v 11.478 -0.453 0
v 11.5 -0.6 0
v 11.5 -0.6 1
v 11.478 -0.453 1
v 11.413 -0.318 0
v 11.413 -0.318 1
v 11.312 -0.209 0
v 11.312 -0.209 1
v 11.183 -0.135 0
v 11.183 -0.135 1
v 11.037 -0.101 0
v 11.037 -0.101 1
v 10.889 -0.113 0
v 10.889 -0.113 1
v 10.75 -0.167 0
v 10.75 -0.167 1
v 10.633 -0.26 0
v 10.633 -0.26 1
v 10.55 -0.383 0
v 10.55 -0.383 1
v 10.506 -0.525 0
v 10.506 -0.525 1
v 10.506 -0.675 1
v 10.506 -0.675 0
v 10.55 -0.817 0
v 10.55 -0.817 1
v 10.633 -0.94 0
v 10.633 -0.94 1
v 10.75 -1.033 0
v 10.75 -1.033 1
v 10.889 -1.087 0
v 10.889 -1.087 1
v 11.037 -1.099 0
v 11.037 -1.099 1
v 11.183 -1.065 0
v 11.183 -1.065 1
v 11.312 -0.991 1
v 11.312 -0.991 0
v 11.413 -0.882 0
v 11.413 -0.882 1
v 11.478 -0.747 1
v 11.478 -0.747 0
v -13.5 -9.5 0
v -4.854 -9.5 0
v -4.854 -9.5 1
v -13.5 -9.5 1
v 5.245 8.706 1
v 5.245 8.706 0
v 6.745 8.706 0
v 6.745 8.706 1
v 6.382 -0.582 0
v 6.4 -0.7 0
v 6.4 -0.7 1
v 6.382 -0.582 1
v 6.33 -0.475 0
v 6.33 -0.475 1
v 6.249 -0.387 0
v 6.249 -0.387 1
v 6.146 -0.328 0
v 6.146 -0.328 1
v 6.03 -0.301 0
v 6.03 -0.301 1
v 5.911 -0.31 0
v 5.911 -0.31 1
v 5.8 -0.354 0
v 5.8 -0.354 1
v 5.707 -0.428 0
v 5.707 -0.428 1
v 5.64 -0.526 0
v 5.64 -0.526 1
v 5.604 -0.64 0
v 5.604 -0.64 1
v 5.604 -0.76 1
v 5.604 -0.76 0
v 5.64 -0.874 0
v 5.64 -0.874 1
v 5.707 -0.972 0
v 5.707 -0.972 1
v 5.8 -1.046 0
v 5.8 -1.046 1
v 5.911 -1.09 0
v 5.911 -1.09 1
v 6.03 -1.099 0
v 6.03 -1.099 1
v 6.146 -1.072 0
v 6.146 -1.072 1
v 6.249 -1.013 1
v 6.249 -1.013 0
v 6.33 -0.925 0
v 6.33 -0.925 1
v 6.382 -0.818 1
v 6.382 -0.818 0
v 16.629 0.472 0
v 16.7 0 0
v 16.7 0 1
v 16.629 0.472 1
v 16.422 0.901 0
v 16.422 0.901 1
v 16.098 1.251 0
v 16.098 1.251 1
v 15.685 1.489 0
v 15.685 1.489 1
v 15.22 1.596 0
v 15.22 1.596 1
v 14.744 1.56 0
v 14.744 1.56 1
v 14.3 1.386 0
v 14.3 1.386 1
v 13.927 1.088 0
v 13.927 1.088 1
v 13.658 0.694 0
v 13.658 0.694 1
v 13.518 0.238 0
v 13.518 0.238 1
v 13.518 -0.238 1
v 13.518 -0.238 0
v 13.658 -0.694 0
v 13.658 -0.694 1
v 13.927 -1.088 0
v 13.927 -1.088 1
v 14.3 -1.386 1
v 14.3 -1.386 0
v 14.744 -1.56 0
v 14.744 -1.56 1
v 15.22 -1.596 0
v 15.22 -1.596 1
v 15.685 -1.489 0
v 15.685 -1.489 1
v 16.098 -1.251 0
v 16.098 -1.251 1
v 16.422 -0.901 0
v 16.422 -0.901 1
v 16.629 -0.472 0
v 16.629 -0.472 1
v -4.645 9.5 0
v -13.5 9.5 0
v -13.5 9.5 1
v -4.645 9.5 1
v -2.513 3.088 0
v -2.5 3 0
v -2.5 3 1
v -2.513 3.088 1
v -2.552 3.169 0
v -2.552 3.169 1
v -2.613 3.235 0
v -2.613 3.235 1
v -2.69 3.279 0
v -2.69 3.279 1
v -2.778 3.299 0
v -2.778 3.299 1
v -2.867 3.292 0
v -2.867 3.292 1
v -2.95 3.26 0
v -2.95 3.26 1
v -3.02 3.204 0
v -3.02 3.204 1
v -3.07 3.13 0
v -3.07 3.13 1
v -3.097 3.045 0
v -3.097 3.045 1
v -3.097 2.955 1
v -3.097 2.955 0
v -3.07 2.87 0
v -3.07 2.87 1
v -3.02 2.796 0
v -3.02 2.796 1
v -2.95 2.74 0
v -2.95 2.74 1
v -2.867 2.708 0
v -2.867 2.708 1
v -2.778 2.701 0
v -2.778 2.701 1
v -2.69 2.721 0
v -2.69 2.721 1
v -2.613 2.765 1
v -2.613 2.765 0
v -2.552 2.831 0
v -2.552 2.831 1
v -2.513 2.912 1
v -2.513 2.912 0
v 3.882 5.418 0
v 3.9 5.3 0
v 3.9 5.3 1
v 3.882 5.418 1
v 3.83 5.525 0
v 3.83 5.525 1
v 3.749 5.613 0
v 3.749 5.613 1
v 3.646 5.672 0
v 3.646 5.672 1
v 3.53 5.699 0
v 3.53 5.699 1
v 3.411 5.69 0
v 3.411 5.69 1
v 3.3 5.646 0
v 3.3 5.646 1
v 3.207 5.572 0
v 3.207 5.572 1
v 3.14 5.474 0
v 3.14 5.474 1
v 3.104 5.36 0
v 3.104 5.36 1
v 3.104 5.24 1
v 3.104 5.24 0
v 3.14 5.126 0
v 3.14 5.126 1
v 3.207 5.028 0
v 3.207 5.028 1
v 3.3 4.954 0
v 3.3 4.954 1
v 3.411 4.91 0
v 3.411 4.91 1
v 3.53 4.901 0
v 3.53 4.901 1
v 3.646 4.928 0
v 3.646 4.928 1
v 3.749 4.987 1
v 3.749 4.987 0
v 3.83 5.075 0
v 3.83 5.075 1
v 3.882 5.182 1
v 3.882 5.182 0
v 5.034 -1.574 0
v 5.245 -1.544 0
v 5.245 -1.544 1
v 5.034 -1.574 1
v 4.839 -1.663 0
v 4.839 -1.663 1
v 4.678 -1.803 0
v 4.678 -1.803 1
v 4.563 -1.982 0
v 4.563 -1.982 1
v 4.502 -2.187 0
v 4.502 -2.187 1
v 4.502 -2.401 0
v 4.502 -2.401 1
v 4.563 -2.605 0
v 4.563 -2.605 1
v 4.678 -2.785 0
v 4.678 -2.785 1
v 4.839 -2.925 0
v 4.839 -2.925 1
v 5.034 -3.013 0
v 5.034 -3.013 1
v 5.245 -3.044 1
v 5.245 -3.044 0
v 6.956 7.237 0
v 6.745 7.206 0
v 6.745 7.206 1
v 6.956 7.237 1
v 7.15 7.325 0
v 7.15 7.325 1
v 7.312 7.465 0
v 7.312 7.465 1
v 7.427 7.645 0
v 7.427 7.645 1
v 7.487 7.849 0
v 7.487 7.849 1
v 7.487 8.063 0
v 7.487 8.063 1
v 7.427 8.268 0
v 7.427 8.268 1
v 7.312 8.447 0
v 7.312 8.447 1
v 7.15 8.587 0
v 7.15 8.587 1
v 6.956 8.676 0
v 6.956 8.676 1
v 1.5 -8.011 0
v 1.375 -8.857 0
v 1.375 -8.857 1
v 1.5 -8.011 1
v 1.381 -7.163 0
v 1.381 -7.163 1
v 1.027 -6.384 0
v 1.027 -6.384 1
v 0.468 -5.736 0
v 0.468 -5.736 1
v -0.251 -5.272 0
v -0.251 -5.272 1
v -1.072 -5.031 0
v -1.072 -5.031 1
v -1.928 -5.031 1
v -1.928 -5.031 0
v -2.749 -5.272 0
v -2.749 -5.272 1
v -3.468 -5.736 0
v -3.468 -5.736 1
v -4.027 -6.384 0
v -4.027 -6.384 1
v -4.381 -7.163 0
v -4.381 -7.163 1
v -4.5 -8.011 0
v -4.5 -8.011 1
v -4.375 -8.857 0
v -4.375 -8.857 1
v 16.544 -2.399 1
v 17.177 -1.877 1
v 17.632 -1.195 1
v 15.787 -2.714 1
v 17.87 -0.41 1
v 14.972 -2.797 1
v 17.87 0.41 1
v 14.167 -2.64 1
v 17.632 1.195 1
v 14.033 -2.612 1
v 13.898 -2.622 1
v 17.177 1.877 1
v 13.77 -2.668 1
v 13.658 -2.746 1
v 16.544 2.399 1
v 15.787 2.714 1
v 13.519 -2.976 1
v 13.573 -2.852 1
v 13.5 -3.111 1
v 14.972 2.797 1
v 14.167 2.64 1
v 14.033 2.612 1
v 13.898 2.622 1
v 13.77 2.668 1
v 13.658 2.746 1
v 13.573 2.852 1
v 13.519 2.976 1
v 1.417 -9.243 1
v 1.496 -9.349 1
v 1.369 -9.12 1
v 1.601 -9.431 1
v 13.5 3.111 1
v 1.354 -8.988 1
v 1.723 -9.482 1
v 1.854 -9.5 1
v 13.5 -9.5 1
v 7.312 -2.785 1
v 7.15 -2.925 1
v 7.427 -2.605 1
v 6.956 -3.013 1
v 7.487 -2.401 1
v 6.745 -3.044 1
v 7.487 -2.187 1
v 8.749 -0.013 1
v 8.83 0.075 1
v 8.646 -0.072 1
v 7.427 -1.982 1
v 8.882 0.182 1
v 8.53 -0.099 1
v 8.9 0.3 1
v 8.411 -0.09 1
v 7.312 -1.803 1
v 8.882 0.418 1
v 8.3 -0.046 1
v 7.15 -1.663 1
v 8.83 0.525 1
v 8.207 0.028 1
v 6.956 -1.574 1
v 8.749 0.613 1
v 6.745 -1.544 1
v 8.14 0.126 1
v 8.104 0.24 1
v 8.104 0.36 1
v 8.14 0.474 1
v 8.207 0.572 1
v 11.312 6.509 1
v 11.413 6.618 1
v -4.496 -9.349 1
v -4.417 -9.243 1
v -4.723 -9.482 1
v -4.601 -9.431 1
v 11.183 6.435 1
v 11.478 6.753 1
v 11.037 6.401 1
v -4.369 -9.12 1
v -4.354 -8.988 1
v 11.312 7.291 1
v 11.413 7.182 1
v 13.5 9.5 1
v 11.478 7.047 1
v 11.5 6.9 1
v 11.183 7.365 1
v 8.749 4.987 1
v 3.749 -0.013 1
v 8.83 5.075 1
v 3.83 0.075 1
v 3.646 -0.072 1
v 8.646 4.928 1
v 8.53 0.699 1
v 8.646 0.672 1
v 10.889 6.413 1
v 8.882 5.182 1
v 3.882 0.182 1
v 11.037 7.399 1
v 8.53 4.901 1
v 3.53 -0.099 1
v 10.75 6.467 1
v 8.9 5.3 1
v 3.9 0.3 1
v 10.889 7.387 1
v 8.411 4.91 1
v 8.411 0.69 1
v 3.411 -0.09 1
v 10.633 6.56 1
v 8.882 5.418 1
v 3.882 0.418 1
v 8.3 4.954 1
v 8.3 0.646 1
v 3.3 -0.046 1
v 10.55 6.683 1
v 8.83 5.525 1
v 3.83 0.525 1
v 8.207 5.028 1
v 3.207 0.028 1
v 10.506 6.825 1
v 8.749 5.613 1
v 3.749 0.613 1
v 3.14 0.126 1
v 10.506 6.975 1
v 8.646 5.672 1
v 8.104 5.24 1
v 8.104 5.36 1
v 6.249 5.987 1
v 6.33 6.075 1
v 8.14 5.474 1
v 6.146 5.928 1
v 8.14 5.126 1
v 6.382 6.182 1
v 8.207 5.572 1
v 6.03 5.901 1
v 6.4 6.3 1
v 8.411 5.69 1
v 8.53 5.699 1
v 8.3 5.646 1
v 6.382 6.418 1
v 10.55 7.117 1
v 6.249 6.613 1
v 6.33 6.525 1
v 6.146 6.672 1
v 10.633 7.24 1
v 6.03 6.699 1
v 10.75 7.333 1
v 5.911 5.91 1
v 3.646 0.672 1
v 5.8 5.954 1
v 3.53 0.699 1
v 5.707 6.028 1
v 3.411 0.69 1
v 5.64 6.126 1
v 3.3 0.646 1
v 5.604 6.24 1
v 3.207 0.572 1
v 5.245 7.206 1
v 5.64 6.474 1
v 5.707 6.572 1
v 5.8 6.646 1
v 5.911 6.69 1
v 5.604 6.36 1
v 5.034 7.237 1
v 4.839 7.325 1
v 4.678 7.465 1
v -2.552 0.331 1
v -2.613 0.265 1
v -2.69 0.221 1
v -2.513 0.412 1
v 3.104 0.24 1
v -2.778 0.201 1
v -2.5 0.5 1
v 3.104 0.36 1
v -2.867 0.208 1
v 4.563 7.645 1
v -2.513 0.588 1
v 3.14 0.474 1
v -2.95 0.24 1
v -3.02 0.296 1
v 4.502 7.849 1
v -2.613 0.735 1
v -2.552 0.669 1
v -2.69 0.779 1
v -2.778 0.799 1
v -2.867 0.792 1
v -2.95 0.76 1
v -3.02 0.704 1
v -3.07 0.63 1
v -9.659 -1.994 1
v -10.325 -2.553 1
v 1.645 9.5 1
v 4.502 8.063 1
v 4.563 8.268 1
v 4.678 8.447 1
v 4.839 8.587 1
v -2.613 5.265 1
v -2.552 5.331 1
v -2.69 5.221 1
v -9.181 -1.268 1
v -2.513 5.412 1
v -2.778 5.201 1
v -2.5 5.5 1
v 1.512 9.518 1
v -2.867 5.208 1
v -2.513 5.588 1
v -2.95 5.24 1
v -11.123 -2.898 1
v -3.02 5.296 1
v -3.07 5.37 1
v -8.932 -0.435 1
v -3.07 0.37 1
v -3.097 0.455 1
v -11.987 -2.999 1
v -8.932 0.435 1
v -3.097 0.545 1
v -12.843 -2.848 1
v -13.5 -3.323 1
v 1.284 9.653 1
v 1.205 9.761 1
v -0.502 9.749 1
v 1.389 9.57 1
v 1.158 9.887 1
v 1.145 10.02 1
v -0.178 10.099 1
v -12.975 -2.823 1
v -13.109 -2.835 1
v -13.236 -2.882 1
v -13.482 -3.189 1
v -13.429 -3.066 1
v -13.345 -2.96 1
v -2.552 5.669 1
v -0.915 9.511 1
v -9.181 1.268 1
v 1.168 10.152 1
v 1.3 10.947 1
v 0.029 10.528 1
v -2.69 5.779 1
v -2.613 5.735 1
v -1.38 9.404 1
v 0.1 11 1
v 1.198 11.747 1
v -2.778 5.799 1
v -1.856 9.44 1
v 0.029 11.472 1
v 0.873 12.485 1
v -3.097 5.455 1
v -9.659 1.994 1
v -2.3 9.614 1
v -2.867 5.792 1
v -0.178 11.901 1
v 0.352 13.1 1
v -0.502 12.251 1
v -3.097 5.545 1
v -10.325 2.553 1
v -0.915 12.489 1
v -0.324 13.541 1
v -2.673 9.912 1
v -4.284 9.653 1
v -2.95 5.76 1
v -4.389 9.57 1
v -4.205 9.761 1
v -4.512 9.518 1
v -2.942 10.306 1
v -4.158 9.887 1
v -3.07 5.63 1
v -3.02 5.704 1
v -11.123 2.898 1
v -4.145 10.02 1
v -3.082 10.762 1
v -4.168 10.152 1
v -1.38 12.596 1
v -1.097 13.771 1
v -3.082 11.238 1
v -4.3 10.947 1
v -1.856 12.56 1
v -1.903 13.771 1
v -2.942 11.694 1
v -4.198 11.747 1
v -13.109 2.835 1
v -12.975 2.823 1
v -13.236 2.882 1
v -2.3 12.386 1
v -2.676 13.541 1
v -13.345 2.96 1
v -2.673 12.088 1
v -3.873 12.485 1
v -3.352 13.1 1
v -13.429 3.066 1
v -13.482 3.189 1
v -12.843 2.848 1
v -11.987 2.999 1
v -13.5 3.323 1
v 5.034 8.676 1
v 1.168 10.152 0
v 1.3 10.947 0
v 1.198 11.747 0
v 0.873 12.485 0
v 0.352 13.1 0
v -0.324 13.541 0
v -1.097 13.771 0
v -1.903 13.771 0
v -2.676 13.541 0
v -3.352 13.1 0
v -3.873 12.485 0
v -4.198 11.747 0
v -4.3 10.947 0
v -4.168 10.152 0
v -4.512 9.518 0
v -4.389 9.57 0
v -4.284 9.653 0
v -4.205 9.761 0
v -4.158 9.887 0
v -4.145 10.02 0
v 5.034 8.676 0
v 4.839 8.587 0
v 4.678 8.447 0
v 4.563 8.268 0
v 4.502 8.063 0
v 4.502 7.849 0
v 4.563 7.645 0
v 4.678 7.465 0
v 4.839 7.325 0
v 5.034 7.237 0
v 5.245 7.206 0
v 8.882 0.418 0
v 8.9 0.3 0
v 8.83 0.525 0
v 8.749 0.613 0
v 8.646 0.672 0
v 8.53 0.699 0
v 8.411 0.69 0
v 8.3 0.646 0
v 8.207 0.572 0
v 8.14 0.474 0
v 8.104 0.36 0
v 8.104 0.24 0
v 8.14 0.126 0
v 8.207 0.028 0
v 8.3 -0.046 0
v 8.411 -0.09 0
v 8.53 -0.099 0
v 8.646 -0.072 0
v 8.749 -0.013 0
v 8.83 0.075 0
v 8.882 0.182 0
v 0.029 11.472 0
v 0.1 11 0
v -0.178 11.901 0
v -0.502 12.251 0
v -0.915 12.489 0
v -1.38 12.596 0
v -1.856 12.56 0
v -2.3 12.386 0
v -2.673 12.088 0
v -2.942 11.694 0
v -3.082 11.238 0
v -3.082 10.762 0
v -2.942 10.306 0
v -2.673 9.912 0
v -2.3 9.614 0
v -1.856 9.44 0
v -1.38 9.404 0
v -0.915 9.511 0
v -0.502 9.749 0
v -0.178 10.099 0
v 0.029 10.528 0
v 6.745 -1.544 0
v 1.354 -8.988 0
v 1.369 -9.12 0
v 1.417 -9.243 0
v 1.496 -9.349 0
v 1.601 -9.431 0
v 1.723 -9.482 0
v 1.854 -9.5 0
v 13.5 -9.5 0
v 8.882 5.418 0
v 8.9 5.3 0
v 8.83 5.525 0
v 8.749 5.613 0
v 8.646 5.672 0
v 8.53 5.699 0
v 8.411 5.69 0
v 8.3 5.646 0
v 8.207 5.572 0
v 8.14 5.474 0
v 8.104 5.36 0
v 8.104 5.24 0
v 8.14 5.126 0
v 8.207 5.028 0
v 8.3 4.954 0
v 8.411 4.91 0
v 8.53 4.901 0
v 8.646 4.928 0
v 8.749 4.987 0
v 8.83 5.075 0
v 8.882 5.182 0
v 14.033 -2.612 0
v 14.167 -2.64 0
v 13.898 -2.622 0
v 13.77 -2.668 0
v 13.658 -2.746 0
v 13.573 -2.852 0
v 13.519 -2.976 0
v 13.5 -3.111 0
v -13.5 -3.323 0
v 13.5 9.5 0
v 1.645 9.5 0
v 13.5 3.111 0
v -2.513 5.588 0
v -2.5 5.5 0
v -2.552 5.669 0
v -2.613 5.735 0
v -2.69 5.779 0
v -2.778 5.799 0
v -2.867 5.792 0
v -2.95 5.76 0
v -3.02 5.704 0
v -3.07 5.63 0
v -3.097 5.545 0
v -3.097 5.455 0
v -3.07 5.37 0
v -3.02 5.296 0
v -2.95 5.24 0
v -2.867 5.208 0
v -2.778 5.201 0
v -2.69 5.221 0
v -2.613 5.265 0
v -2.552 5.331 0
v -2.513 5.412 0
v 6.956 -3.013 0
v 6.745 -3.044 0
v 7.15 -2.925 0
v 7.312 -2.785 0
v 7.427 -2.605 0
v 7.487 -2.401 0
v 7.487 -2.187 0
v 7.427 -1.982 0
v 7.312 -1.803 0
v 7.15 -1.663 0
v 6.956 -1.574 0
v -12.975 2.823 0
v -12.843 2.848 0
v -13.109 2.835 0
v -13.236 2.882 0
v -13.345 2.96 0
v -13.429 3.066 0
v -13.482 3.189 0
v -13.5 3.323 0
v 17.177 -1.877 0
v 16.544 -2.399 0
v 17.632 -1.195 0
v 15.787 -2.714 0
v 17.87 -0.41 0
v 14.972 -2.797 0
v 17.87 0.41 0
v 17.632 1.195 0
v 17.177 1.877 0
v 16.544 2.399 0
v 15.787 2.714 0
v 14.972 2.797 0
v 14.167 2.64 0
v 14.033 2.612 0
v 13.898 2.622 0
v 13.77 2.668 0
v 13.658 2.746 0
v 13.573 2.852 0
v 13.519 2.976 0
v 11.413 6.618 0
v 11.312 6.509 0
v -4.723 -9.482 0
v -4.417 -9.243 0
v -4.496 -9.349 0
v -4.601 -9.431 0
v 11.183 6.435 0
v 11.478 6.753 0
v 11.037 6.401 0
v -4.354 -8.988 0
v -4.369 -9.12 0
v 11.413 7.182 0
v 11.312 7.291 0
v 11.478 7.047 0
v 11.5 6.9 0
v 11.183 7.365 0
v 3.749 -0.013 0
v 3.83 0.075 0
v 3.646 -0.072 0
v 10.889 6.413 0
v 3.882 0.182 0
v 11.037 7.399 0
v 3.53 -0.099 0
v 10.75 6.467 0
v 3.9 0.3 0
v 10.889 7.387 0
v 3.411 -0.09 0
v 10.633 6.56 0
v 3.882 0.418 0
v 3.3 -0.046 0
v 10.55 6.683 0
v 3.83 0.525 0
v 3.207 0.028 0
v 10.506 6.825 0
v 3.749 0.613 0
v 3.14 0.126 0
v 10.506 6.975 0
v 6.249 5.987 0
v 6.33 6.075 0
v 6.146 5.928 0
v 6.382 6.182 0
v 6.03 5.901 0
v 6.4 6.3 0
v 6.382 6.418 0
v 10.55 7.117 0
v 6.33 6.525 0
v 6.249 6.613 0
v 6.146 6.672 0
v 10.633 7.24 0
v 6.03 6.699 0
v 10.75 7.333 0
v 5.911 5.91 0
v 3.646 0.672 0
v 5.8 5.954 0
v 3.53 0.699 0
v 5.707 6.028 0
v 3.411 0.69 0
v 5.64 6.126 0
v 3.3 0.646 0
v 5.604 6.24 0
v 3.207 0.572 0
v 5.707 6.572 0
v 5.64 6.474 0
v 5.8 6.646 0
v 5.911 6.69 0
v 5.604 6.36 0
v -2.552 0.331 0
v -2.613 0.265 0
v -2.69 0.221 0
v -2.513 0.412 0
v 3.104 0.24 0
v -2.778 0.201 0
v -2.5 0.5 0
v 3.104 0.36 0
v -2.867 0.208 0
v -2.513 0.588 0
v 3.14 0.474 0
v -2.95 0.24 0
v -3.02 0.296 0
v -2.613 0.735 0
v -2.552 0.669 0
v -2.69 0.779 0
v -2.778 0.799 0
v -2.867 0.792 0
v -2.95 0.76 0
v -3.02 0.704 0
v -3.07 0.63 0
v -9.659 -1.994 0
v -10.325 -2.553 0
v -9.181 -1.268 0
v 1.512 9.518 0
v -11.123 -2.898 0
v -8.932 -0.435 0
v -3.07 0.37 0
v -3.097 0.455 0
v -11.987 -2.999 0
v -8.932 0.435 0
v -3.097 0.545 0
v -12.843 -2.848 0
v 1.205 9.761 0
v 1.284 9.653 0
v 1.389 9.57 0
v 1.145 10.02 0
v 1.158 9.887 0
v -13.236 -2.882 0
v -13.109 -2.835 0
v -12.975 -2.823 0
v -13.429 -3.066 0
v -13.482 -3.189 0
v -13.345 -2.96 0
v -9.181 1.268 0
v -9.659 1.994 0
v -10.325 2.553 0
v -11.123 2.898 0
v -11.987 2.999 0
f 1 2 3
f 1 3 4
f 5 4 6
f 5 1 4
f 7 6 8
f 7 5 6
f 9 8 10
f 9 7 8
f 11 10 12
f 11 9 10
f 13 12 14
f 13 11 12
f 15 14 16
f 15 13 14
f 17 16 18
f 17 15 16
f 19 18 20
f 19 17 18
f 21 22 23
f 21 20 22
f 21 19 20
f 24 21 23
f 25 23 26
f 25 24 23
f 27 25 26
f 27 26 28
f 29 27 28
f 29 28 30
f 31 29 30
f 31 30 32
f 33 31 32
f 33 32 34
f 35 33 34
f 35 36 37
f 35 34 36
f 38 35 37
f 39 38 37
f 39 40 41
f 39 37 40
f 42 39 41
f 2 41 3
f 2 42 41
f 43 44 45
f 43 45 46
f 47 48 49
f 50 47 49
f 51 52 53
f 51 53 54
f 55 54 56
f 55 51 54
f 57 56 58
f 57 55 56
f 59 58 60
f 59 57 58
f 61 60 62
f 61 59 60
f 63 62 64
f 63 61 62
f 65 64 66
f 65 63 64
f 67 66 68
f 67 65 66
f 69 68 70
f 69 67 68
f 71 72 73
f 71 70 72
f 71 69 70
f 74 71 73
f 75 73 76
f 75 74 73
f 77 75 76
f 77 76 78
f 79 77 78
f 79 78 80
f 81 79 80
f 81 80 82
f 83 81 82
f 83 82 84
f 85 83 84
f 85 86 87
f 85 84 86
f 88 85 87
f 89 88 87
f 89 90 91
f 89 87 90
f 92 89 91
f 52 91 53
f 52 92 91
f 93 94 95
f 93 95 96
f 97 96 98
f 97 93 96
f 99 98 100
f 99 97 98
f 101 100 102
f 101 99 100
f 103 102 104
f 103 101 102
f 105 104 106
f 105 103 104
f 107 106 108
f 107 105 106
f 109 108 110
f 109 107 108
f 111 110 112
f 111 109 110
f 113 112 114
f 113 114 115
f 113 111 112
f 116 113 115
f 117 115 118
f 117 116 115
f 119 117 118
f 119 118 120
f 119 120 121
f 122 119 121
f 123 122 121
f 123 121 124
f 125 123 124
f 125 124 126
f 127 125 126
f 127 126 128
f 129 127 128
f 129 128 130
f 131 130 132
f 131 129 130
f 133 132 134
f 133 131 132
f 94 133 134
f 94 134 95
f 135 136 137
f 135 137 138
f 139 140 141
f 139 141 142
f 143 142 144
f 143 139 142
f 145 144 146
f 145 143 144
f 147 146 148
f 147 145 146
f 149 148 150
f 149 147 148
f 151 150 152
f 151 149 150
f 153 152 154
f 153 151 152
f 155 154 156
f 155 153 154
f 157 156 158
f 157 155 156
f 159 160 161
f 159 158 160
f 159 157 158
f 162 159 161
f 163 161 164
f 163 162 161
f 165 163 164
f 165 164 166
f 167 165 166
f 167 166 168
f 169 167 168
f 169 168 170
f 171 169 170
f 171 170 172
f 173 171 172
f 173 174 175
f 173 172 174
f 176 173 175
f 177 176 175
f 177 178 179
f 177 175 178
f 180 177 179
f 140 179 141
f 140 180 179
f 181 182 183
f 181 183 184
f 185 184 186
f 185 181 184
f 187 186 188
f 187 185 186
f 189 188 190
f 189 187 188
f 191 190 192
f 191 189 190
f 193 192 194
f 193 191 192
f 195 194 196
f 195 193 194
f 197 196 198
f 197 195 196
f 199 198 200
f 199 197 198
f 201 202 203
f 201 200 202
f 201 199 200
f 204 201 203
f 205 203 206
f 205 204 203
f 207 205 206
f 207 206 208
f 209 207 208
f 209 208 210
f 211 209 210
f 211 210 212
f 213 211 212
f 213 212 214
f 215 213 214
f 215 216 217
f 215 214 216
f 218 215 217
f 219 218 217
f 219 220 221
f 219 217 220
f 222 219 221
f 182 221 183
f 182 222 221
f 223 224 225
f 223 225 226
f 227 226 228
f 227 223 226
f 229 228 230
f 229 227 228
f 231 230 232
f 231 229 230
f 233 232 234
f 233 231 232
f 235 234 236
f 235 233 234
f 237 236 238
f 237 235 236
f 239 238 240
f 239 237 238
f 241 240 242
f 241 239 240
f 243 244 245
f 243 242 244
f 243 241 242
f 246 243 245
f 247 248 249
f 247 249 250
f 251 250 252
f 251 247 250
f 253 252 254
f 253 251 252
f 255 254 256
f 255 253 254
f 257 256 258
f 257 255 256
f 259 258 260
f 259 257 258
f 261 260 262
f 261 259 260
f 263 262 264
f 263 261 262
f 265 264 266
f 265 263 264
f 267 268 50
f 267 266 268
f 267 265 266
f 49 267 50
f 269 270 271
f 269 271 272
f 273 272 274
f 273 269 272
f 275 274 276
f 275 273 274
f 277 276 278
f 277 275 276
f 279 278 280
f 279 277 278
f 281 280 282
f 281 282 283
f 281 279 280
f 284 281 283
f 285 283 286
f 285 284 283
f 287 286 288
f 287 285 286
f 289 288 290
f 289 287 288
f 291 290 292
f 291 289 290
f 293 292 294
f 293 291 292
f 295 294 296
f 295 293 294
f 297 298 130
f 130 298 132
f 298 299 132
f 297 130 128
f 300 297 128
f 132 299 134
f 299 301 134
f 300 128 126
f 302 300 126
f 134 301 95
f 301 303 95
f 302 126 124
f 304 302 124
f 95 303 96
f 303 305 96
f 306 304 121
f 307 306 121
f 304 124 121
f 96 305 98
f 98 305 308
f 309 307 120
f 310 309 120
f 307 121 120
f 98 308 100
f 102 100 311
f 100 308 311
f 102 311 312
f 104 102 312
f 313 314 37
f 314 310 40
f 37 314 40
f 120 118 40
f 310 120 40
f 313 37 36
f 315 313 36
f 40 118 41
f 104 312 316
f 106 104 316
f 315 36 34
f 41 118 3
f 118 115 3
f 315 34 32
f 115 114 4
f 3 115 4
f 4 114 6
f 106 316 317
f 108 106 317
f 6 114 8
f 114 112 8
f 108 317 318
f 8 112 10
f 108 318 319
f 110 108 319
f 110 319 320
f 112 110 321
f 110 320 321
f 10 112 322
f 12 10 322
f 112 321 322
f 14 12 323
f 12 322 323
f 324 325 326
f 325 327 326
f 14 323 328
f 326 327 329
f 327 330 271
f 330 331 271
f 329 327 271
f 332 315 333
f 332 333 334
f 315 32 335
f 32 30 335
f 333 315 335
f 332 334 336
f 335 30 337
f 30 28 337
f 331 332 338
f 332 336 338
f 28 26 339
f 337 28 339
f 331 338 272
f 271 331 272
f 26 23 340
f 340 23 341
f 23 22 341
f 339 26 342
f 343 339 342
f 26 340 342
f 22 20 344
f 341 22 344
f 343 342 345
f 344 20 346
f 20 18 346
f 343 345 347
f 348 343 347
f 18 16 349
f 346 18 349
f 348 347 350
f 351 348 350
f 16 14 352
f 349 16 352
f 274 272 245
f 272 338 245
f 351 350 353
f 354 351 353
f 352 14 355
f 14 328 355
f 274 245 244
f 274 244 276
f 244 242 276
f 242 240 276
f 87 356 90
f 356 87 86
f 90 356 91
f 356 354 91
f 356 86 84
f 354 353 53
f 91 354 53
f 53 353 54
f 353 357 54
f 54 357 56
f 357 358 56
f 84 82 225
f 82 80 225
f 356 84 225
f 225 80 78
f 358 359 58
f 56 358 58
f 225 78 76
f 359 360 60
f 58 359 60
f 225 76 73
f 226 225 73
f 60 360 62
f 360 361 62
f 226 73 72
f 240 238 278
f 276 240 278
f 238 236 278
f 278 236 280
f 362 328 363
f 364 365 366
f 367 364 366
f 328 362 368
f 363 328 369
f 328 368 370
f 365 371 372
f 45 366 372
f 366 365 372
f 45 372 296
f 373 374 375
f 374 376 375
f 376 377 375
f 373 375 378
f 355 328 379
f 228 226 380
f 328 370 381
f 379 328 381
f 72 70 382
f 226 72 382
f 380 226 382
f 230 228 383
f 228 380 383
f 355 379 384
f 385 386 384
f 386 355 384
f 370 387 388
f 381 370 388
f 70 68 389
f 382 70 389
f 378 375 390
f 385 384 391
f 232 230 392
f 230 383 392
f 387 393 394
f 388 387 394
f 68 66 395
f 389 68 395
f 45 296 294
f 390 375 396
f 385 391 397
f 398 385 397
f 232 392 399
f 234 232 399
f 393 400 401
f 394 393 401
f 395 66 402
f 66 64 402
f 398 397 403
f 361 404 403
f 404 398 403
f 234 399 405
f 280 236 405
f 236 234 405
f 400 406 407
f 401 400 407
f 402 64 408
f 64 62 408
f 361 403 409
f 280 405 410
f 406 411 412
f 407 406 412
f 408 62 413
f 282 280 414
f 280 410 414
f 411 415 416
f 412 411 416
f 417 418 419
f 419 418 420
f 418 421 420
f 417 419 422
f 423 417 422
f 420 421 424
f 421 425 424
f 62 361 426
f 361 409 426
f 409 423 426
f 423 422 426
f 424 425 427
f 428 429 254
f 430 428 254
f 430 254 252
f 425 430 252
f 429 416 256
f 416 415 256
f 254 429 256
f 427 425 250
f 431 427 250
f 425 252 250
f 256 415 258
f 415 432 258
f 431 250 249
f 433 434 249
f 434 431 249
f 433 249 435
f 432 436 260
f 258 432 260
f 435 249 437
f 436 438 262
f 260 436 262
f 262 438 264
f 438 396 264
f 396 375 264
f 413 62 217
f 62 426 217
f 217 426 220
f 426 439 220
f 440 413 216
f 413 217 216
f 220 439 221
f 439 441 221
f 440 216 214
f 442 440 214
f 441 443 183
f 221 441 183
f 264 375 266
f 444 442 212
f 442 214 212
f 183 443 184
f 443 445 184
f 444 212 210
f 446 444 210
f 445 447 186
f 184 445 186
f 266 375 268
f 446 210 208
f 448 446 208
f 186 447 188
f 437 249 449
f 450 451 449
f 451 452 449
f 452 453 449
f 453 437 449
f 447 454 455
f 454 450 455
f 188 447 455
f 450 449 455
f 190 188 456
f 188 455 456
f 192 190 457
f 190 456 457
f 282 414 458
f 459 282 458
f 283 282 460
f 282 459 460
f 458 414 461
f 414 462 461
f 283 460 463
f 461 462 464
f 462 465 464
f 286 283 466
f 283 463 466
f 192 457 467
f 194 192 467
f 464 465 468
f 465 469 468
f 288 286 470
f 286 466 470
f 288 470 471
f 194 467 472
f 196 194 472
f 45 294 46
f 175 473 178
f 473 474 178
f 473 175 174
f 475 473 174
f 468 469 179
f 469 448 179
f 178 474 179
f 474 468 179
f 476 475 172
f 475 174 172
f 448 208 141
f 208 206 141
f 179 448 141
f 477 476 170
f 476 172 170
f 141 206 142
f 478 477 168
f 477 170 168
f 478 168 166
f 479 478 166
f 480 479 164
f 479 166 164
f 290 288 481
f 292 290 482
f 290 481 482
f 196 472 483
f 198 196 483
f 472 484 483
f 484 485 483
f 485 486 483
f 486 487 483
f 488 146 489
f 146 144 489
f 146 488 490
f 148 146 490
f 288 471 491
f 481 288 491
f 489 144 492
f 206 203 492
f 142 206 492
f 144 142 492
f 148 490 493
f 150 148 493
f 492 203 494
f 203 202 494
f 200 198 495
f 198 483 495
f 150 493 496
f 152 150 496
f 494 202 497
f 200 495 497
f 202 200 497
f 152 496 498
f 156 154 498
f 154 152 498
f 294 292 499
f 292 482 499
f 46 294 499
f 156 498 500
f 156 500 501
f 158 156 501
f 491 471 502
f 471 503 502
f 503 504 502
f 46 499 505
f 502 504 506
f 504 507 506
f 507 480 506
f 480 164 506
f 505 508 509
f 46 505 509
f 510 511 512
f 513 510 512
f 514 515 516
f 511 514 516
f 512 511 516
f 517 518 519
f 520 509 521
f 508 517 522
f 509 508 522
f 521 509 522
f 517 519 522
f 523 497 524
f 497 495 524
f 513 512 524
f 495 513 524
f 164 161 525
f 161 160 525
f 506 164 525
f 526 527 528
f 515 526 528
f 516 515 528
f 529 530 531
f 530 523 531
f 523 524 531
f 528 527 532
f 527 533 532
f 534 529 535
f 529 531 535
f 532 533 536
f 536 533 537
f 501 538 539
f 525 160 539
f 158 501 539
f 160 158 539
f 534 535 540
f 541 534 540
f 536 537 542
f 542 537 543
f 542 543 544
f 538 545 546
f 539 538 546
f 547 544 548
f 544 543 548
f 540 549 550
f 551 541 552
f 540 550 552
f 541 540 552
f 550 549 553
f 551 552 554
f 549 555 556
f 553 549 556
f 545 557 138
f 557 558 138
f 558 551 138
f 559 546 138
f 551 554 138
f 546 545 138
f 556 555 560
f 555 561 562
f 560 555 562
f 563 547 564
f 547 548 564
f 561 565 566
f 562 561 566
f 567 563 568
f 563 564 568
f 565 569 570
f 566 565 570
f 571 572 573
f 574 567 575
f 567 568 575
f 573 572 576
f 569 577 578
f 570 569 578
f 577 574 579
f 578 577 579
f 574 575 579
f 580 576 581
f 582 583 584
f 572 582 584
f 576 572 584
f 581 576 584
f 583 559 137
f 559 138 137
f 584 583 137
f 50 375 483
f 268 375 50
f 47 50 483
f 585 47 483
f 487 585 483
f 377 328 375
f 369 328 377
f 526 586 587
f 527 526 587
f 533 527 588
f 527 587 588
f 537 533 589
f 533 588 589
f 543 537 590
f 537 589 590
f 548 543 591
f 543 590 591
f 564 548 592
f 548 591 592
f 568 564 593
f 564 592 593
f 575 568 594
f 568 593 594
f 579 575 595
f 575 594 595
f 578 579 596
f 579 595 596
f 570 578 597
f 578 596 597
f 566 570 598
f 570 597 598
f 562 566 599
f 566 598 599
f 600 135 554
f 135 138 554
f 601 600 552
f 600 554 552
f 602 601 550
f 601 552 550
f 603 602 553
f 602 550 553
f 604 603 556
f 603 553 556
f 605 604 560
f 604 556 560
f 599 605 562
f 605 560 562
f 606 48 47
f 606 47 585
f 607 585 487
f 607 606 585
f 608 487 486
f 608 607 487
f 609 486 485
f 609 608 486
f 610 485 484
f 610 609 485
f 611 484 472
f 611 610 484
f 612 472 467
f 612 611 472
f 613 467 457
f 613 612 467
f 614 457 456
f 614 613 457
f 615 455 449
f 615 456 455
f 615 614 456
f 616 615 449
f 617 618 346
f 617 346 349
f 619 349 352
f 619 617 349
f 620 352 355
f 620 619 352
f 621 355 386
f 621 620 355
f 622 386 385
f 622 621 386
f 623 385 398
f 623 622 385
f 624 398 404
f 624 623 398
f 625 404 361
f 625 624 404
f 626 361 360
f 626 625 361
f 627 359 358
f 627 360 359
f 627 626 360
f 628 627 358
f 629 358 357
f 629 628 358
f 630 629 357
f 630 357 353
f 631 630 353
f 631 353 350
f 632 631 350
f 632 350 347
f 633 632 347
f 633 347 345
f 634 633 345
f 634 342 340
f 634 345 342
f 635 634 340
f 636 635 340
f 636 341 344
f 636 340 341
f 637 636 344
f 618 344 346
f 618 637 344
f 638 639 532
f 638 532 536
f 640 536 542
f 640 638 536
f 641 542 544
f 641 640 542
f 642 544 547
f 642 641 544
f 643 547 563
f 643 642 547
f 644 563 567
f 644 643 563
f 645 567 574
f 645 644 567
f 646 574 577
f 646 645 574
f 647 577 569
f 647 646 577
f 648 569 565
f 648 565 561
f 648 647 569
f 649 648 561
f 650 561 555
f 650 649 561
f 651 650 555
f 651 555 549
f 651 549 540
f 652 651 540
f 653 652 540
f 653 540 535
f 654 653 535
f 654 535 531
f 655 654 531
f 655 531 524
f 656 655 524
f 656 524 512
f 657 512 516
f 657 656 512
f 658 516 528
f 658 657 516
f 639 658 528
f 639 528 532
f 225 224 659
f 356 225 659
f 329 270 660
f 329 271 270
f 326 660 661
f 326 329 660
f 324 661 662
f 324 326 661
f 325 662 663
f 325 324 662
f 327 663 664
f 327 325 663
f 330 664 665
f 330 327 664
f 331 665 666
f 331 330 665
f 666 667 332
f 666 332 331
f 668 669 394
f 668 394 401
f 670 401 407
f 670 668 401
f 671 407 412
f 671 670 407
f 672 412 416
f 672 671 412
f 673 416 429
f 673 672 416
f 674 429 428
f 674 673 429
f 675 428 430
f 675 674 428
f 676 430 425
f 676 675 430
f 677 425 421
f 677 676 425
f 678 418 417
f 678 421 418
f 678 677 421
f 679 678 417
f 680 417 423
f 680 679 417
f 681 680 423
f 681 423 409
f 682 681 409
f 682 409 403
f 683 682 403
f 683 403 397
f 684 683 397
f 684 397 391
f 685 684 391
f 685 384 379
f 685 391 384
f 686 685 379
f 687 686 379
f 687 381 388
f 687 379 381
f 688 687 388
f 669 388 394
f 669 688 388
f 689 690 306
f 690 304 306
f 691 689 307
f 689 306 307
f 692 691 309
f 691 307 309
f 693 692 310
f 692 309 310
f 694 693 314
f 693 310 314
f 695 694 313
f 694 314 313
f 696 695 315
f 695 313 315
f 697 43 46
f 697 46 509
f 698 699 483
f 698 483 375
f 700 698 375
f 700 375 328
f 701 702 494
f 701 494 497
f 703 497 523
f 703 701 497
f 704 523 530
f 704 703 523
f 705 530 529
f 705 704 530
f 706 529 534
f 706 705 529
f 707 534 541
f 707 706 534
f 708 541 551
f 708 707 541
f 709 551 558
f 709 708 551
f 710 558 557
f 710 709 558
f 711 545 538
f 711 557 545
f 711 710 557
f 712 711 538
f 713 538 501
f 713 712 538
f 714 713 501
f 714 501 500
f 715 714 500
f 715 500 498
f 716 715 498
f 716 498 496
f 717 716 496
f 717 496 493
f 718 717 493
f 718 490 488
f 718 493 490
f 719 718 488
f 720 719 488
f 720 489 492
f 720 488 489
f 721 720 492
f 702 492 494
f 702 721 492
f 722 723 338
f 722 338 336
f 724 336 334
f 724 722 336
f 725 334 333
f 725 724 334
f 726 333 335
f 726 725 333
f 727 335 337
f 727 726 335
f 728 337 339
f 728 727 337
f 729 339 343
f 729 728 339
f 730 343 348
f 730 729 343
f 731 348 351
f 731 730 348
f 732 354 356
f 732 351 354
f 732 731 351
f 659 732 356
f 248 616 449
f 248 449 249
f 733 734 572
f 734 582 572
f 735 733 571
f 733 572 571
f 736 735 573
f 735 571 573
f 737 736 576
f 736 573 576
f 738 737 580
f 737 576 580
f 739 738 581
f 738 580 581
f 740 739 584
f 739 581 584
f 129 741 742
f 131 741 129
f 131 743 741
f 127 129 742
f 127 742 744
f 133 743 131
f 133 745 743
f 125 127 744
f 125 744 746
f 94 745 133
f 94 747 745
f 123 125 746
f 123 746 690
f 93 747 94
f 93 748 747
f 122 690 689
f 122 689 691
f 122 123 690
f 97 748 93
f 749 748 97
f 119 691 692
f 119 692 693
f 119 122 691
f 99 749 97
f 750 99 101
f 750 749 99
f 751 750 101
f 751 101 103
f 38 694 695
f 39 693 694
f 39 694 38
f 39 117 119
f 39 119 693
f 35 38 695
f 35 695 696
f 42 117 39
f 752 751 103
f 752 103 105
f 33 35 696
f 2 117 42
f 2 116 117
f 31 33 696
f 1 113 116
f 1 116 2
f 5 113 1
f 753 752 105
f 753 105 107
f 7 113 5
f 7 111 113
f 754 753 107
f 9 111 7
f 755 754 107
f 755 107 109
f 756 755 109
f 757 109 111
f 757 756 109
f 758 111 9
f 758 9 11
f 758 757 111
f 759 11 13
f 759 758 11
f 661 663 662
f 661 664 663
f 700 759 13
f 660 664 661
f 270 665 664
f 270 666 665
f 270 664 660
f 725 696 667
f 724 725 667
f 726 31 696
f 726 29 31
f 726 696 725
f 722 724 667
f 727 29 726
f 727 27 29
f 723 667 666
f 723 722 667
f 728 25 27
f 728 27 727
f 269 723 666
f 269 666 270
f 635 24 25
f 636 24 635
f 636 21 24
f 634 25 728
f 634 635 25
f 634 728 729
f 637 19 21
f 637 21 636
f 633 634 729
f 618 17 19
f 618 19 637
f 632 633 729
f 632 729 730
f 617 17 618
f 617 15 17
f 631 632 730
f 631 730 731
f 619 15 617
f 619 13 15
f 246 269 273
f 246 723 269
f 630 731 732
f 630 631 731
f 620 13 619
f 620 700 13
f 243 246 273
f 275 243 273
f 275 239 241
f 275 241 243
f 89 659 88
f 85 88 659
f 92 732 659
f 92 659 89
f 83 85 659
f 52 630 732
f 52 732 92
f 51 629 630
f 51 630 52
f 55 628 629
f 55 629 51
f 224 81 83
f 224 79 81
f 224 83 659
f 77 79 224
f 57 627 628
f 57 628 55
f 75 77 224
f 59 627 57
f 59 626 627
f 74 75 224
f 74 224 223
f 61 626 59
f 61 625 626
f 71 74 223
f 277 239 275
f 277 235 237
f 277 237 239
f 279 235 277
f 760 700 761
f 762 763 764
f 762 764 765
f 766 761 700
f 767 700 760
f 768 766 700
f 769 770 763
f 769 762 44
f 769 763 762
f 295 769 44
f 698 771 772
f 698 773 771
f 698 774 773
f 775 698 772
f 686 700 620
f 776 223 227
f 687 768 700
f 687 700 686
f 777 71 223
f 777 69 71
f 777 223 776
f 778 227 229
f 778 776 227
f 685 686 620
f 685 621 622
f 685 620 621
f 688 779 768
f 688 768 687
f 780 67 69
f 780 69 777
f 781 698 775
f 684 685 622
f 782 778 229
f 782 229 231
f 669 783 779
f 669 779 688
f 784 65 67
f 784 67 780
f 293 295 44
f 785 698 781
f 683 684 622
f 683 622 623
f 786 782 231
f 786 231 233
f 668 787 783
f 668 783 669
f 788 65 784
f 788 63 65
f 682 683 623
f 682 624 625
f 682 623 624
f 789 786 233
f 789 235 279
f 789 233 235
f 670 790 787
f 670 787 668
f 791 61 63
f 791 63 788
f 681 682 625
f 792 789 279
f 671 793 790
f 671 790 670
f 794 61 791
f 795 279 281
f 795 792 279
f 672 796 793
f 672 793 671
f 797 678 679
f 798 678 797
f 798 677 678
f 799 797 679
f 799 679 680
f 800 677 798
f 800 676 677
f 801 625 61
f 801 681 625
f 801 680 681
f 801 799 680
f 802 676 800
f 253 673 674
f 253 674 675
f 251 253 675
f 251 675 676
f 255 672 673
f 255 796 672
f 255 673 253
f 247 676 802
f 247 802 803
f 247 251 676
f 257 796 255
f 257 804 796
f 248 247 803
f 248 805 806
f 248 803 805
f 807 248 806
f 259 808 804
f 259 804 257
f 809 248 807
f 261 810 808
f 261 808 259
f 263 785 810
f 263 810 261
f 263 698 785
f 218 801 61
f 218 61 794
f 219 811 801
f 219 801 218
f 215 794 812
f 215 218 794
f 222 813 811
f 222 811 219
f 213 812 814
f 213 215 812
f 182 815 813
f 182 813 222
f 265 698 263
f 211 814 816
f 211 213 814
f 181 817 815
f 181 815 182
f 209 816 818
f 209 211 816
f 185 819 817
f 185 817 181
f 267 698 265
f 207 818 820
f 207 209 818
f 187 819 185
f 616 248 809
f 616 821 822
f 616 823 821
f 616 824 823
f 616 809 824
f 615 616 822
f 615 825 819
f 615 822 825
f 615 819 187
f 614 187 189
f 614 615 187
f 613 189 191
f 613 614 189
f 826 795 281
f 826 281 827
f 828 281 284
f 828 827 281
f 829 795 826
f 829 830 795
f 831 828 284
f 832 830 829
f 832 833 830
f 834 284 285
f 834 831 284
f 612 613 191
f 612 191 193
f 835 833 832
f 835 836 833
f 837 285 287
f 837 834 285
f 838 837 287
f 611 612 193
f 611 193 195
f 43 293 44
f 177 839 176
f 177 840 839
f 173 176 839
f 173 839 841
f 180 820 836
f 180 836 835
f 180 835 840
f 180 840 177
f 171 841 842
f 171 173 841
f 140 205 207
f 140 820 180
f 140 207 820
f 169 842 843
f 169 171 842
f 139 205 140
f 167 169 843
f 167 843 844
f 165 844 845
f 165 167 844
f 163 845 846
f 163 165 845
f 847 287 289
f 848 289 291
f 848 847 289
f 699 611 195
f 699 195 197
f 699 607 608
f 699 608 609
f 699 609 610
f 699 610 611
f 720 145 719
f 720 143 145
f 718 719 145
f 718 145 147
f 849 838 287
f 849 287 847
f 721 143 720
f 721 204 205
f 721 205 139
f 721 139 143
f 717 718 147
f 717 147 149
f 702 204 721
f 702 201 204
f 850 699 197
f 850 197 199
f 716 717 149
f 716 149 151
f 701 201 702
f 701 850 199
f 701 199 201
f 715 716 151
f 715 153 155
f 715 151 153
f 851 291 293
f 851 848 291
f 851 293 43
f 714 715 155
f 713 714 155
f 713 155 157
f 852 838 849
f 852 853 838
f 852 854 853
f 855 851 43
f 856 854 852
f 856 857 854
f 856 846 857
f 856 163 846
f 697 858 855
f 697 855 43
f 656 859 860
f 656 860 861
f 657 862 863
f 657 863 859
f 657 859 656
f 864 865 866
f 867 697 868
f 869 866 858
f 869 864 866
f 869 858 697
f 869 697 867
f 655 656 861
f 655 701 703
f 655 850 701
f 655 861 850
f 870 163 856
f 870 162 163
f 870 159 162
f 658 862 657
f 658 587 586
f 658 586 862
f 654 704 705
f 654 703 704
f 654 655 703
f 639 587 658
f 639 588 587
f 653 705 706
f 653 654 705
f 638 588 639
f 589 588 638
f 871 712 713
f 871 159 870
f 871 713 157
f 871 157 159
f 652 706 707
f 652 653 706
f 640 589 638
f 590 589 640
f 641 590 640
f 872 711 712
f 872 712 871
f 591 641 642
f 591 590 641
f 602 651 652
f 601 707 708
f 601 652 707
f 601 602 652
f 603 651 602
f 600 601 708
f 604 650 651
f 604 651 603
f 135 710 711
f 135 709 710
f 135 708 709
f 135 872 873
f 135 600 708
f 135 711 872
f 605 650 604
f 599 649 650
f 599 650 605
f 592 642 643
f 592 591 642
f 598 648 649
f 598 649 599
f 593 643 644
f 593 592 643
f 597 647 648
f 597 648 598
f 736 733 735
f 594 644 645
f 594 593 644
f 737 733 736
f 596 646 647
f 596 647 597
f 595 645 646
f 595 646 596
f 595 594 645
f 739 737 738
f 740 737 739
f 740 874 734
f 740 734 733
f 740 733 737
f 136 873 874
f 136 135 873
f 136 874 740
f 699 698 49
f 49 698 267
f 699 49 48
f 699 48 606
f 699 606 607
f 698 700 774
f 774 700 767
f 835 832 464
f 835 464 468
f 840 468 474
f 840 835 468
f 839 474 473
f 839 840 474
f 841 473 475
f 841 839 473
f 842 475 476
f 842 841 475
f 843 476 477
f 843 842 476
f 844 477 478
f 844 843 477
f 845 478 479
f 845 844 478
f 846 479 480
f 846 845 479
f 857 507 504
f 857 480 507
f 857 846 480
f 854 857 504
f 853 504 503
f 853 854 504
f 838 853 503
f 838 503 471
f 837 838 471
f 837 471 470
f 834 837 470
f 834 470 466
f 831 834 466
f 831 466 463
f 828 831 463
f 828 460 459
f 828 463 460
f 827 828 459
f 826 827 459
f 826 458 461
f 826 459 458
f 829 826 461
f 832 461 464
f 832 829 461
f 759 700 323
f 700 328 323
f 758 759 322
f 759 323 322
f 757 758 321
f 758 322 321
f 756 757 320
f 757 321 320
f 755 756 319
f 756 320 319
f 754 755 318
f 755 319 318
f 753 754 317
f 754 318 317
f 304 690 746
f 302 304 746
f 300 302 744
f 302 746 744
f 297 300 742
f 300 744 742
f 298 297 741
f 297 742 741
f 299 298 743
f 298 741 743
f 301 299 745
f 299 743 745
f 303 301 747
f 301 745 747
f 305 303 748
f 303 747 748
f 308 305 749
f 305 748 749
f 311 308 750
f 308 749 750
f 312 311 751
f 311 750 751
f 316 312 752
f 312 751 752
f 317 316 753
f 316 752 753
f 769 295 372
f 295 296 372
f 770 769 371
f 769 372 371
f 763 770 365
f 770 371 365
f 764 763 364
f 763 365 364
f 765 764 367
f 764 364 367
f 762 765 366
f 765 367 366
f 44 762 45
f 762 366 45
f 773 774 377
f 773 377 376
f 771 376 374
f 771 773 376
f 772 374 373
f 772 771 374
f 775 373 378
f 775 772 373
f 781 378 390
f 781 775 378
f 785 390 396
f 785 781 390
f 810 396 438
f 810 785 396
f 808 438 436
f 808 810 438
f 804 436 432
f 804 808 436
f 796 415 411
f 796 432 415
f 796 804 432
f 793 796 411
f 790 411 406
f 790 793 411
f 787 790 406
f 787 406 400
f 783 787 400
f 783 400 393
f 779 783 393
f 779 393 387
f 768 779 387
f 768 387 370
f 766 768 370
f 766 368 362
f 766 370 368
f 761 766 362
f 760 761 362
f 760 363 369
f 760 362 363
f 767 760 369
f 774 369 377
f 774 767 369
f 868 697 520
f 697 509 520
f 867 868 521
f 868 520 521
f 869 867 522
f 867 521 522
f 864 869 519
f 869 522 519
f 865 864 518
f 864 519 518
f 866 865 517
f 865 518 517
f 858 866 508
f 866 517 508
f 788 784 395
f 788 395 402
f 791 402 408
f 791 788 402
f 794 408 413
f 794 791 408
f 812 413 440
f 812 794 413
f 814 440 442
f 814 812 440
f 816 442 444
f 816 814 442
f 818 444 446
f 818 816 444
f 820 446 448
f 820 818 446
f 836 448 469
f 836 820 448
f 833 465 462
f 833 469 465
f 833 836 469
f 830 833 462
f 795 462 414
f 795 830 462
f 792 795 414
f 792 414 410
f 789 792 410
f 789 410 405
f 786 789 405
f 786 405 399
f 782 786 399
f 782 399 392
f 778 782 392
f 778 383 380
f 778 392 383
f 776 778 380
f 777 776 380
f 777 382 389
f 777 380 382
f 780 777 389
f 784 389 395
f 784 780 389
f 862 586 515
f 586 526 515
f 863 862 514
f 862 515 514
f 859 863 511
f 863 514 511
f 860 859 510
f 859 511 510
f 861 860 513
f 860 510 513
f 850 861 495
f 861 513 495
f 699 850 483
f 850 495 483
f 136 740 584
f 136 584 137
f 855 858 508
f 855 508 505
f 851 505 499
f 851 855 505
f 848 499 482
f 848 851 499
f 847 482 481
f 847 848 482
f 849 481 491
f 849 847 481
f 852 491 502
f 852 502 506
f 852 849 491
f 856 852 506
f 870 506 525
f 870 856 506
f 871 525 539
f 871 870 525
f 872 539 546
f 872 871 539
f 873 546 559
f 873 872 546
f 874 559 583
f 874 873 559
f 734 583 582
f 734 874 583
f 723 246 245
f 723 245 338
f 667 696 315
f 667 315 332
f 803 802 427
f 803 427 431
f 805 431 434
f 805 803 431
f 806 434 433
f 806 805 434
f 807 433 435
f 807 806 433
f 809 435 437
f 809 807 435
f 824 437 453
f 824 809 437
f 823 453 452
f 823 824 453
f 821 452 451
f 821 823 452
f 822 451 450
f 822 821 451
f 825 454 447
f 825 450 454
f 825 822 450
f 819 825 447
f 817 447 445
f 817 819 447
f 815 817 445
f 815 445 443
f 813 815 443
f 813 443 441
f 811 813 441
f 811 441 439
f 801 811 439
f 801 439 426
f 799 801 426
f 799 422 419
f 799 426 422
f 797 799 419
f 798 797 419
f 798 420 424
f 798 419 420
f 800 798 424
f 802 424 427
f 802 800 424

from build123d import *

# Parameters (mm, degrees)
CYLINDER012_R     = 0.5
CYLINDER012_DEPTH = 10
CYLINDER011_R     = 0.5
CYLINDER011_DEPTH = 10
CYLINDER010_R     = 0.3
CYLINDER010_DEPTH = 10
CYLINDER009_R     = 0.3
CYLINDER009_DEPTH = 10
CYLINDER008_R     = 0.3
CYLINDER008_DEPTH = 10
PAD004_DEPTH      = 5
PAD003_DEPTH      = 5
CYLINDER007_R     = 0.4
CYLINDER007_DEPTH = 10
CYLINDER006_R     = 0.4
CYLINDER006_DEPTH = 10
CYLINDER005_R     = 0.4
CYLINDER005_DEPTH = 10
CYLINDER004_R     = 0.4
CYLINDER004_DEPTH = 10
CYLINDER003_R     = 0.4
CYLINDER003_DEPTH = 10
CYLINDER002_R     = 0.4
CYLINDER002_DEPTH = 10
SKETCH_R          = 1.6
PAD_DEPTH         = 1
FILLET_R          = 0.5
FILLET001_R       = 0.5
FILLET002_R       = 0.5
FILLET003_R       = 0.5
FILLET004_R       = 0.5
FILLET005_R       = 0.5


with BuildPart() as cilindro012:
    # Cylinder012 → Cylinder012 (new body)
    with BuildSketch(Plane(origin=(11, -0.6, -2), x_dir=(1, 0, 0), z_dir=(0, 0, 1))):
        Circle(CYLINDER012_R)
    extrude(amount=CYLINDER012_DEPTH)


with BuildPart() as cilindro011:
    # Cylinder011 → Cylinder011 (new body)
    with BuildSketch(Plane(origin=(11, 6.9, -2), x_dir=(1, 0, 0), z_dir=(0, 0, 1))):
        Circle(CYLINDER011_R)
    extrude(amount=CYLINDER011_DEPTH)


with BuildPart() as cilindro010:
    # Cylinder010 → Cylinder010 (new body)
    with BuildSketch(Plane(origin=(-2.8, 0.5, -2), x_dir=(1, 0, 0), z_dir=(0, 0, 1))):
        Circle(CYLINDER010_R)
    extrude(amount=CYLINDER010_DEPTH)


with BuildPart() as cilindro009:
    # Cylinder009 → Cylinder009 (new body)
    with BuildSketch(Plane(origin=(-2.8, 3, -2), x_dir=(1, 0, 0), z_dir=(0, 0, 1))):
        Circle(CYLINDER009_R)
    extrude(amount=CYLINDER009_DEPTH)


with BuildPart() as cilindro008:
    # Cylinder008 → Cylinder008 (new body)
    with BuildSketch(Plane(origin=(-2.8, 5.5, -2), x_dir=(1, 0, 0), z_dir=(0, 0, 1))):
        Circle(CYLINDER008_R)
    extrude(amount=CYLINDER008_DEPTH)


with BuildPart() as pad004:
    # Sketch008 → Pad004 (new body)
    with BuildSketch(Plane(origin=(0, -9, 0), x_dir=(1, 0, 0), z_dir=(0, 0, 1))):
        with BuildLine():
            ThreePointArc((5.24484, 7.456211), (4.49484, 6.706211), (5.24484, 5.956211))
            Line((5.24484, 5.956211), (6.74484, 5.956211))
            ThreePointArc((6.74484, 5.956211), (7.49484, 6.706211), (6.74484, 7.456211))
            Line((5.24484, 7.456211), (6.74484, 7.456211))
        make_face()
    extrude(amount=PAD004_DEPTH)


with BuildPart() as pad003:
    # Sketch007 → Pad003 (new body)
    with BuildSketch(Plane(origin=(0, 1.25, 0), x_dir=(1, 0, 0), z_dir=(0, 0, 1))):
        with BuildLine():
            ThreePointArc((5.24484, 7.456211), (4.49484, 6.706211), (5.24484, 5.956211))
            Line((5.24484, 5.956211), (6.74484, 5.956211))
            ThreePointArc((6.74484, 5.956211), (7.49484, 6.706211), (6.74484, 7.456211))
            Line((5.24484, 7.456211), (6.74484, 7.456211))
        make_face()
    extrude(amount=PAD003_DEPTH)


with BuildPart() as cilindro007:
    # Cylinder007 → Cylinder007 (new body)
    with BuildSketch(Plane(origin=(6, 6.3, -2), x_dir=(1, 0, 0), z_dir=(0, 0, 1))):
        Circle(CYLINDER007_R)
    extrude(amount=CYLINDER007_DEPTH)


with BuildPart() as cilindro006:
    # Cylinder006 → Cylinder006 (new body)
    with BuildSketch(Plane(origin=(6, -0.7, -2), x_dir=(1, 0, 0), z_dir=(0, 0, 1))):
        Circle(CYLINDER006_R)
    extrude(amount=CYLINDER006_DEPTH)


with BuildPart() as cilindro005:
    # Cylinder005 → Cylinder005 (new body)
    with BuildSketch(Plane(origin=(8.5, 5.3, -2), x_dir=(1, 0, 0), z_dir=(0, 0, 1))):
        Circle(CYLINDER005_R)
    extrude(amount=CYLINDER005_DEPTH)


with BuildPart() as cilindro004:
    # Cylinder004 → Cylinder004 (new body)
    with BuildSketch(Plane(origin=(3.5, 5.3, -2), x_dir=(1, 0, 0), z_dir=(0, 0, 1))):
        Circle(CYLINDER004_R)
    extrude(amount=CYLINDER004_DEPTH)


with BuildPart() as cilindro003:
    # Cylinder003 → Cylinder003 (new body)
    with BuildSketch(Plane(origin=(8.5, 0.3, -2), x_dir=(1, 0, 0), z_dir=(0, 0, 1))):
        Circle(CYLINDER003_R)
    extrude(amount=CYLINDER003_DEPTH)


with BuildPart() as cilindro002:
    # Cylinder002 → Cylinder002 (new body)
    with BuildSketch(Plane(origin=(3.5, 0.3, -2), x_dir=(1, 0, 0), z_dir=(0, 0, 1))):
        Circle(CYLINDER002_R)
    extrude(amount=CYLINDER002_DEPTH)


with BuildPart() as baseled:
    # Sketch → Pad (new body)
    with BuildSketch(Plane.XY):
        with BuildLine():
            Line((-13.5, 9.5), (-3.864318, 9.5))
            ThreePointArc((0.864318, 9.5), (-1.5, 13.8), (-3.864318, 9.5))
            Line((0.864318, 9.5), (13.5, 9.5))
            Line((13.5, 9.5), (13.5, 2.297825))
            ThreePointArc((13.5, -2.297825), (17.9, 0), (13.5, 2.297825))
            Line((13.5, -2.297825), (13.5, -9.5))
            Line((13.5, -9.5), (1.098076, -9.5))
            ThreePointArc((1.098076, -9.5), (-1.5, -5), (-4.098076, -9.5))
            Line((-4.098076, -9.5), (-13.5, -9.5))
            Line((-13.5, -9.5), (-13.5, -2.537716))
            ThreePointArc((-13.5, -2.537716), (-8.9, 0), (-13.5, 2.537716))
            Line((-13.5, 2.537716), (-13.5, 9.5))
        make_face()
        with Locations((-1.5, 11)):
            Circle(SKETCH_R, mode=Mode.SUBTRACT)
        with Locations((15.1, 0)):
            Circle(SKETCH_R, mode=Mode.SUBTRACT)
    extrude(amount=PAD_DEPTH)

    # Fillet
    fillet_edges = [baseled.edges().sort_by_distance(p)[0] for p in [
        (-3.864318, 9.5, 0.5),
    ]]
    fillet(fillet_edges, radius=FILLET_R)

    # Fillet001
    fillet001_edges = [baseled.edges().sort_by_distance(p)[0] for p in [
        (0.864318, 9.5, 0.5),
    ]]
    fillet(fillet001_edges, radius=FILLET001_R)

    # Fillet002
    fillet002_edges = [baseled.edges().sort_by_distance(p)[0] for p in [
        (13.5, 2.297825, 0.5),
    ]]
    fillet(fillet002_edges, radius=FILLET002_R)

    # Fillet003
    fillet003_edges = [baseled.edges().sort_by_distance(p)[0] for p in [
        (13.5, -2.297825, 0.5),
    ]]
    fillet(fillet003_edges, radius=FILLET003_R)

    # Fillet004
    fillet004_edges = [baseled.edges().sort_by_distance(p)[0] for p in [
        (-4.098076, -9.5, 0.5),
    ]]
    fillet(fillet004_edges, radius=FILLET004_R)

    # Fillet005
    fillet005_edges = [baseled.edges().sort_by_distance(p)[0] for p in [
        (1.098076, -9.5, 0.5),
        (-13.5, -2.537716, 0.5),
        (-13.5, 2.537716, 0.5),
    ]]
    fillet(fillet005_edges, radius=FILLET005_R)

    # Cut003: cut Cilindro002
    add(cilindro002.part, mode=Mode.SUBTRACT)

    # Cut004: cut Cilindro003
    add(cilindro003.part, mode=Mode.SUBTRACT)

    # Cut005: cut Cilindro004
    add(cilindro004.part, mode=Mode.SUBTRACT)

    # Cut006: cut Cilindro005
    add(cilindro005.part, mode=Mode.SUBTRACT)

    # Cut007: cut Cilindro006
    add(cilindro006.part, mode=Mode.SUBTRACT)

    # Cut008: cut Cilindro007
    add(cilindro007.part, mode=Mode.SUBTRACT)

    # Cut009: cut Pad003
    add(pad003.part, mode=Mode.SUBTRACT)

    # Cut010: cut Pad004
    add(pad004.part, mode=Mode.SUBTRACT)

    # Cut011: cut Cilindro008
    add(cilindro008.part, mode=Mode.SUBTRACT)

    # Cut012: cut Cilindro009
    add(cilindro009.part, mode=Mode.SUBTRACT)

    # Cut013: cut Cilindro010
    add(cilindro010.part, mode=Mode.SUBTRACT)

    # Cut014: cut Cilindro011
    add(cilindro011.part, mode=Mode.SUBTRACT)

    # Cut015: cut Cilindro012
    add(cilindro012.part, mode=Mode.SUBTRACT)


solid = baseled.part
